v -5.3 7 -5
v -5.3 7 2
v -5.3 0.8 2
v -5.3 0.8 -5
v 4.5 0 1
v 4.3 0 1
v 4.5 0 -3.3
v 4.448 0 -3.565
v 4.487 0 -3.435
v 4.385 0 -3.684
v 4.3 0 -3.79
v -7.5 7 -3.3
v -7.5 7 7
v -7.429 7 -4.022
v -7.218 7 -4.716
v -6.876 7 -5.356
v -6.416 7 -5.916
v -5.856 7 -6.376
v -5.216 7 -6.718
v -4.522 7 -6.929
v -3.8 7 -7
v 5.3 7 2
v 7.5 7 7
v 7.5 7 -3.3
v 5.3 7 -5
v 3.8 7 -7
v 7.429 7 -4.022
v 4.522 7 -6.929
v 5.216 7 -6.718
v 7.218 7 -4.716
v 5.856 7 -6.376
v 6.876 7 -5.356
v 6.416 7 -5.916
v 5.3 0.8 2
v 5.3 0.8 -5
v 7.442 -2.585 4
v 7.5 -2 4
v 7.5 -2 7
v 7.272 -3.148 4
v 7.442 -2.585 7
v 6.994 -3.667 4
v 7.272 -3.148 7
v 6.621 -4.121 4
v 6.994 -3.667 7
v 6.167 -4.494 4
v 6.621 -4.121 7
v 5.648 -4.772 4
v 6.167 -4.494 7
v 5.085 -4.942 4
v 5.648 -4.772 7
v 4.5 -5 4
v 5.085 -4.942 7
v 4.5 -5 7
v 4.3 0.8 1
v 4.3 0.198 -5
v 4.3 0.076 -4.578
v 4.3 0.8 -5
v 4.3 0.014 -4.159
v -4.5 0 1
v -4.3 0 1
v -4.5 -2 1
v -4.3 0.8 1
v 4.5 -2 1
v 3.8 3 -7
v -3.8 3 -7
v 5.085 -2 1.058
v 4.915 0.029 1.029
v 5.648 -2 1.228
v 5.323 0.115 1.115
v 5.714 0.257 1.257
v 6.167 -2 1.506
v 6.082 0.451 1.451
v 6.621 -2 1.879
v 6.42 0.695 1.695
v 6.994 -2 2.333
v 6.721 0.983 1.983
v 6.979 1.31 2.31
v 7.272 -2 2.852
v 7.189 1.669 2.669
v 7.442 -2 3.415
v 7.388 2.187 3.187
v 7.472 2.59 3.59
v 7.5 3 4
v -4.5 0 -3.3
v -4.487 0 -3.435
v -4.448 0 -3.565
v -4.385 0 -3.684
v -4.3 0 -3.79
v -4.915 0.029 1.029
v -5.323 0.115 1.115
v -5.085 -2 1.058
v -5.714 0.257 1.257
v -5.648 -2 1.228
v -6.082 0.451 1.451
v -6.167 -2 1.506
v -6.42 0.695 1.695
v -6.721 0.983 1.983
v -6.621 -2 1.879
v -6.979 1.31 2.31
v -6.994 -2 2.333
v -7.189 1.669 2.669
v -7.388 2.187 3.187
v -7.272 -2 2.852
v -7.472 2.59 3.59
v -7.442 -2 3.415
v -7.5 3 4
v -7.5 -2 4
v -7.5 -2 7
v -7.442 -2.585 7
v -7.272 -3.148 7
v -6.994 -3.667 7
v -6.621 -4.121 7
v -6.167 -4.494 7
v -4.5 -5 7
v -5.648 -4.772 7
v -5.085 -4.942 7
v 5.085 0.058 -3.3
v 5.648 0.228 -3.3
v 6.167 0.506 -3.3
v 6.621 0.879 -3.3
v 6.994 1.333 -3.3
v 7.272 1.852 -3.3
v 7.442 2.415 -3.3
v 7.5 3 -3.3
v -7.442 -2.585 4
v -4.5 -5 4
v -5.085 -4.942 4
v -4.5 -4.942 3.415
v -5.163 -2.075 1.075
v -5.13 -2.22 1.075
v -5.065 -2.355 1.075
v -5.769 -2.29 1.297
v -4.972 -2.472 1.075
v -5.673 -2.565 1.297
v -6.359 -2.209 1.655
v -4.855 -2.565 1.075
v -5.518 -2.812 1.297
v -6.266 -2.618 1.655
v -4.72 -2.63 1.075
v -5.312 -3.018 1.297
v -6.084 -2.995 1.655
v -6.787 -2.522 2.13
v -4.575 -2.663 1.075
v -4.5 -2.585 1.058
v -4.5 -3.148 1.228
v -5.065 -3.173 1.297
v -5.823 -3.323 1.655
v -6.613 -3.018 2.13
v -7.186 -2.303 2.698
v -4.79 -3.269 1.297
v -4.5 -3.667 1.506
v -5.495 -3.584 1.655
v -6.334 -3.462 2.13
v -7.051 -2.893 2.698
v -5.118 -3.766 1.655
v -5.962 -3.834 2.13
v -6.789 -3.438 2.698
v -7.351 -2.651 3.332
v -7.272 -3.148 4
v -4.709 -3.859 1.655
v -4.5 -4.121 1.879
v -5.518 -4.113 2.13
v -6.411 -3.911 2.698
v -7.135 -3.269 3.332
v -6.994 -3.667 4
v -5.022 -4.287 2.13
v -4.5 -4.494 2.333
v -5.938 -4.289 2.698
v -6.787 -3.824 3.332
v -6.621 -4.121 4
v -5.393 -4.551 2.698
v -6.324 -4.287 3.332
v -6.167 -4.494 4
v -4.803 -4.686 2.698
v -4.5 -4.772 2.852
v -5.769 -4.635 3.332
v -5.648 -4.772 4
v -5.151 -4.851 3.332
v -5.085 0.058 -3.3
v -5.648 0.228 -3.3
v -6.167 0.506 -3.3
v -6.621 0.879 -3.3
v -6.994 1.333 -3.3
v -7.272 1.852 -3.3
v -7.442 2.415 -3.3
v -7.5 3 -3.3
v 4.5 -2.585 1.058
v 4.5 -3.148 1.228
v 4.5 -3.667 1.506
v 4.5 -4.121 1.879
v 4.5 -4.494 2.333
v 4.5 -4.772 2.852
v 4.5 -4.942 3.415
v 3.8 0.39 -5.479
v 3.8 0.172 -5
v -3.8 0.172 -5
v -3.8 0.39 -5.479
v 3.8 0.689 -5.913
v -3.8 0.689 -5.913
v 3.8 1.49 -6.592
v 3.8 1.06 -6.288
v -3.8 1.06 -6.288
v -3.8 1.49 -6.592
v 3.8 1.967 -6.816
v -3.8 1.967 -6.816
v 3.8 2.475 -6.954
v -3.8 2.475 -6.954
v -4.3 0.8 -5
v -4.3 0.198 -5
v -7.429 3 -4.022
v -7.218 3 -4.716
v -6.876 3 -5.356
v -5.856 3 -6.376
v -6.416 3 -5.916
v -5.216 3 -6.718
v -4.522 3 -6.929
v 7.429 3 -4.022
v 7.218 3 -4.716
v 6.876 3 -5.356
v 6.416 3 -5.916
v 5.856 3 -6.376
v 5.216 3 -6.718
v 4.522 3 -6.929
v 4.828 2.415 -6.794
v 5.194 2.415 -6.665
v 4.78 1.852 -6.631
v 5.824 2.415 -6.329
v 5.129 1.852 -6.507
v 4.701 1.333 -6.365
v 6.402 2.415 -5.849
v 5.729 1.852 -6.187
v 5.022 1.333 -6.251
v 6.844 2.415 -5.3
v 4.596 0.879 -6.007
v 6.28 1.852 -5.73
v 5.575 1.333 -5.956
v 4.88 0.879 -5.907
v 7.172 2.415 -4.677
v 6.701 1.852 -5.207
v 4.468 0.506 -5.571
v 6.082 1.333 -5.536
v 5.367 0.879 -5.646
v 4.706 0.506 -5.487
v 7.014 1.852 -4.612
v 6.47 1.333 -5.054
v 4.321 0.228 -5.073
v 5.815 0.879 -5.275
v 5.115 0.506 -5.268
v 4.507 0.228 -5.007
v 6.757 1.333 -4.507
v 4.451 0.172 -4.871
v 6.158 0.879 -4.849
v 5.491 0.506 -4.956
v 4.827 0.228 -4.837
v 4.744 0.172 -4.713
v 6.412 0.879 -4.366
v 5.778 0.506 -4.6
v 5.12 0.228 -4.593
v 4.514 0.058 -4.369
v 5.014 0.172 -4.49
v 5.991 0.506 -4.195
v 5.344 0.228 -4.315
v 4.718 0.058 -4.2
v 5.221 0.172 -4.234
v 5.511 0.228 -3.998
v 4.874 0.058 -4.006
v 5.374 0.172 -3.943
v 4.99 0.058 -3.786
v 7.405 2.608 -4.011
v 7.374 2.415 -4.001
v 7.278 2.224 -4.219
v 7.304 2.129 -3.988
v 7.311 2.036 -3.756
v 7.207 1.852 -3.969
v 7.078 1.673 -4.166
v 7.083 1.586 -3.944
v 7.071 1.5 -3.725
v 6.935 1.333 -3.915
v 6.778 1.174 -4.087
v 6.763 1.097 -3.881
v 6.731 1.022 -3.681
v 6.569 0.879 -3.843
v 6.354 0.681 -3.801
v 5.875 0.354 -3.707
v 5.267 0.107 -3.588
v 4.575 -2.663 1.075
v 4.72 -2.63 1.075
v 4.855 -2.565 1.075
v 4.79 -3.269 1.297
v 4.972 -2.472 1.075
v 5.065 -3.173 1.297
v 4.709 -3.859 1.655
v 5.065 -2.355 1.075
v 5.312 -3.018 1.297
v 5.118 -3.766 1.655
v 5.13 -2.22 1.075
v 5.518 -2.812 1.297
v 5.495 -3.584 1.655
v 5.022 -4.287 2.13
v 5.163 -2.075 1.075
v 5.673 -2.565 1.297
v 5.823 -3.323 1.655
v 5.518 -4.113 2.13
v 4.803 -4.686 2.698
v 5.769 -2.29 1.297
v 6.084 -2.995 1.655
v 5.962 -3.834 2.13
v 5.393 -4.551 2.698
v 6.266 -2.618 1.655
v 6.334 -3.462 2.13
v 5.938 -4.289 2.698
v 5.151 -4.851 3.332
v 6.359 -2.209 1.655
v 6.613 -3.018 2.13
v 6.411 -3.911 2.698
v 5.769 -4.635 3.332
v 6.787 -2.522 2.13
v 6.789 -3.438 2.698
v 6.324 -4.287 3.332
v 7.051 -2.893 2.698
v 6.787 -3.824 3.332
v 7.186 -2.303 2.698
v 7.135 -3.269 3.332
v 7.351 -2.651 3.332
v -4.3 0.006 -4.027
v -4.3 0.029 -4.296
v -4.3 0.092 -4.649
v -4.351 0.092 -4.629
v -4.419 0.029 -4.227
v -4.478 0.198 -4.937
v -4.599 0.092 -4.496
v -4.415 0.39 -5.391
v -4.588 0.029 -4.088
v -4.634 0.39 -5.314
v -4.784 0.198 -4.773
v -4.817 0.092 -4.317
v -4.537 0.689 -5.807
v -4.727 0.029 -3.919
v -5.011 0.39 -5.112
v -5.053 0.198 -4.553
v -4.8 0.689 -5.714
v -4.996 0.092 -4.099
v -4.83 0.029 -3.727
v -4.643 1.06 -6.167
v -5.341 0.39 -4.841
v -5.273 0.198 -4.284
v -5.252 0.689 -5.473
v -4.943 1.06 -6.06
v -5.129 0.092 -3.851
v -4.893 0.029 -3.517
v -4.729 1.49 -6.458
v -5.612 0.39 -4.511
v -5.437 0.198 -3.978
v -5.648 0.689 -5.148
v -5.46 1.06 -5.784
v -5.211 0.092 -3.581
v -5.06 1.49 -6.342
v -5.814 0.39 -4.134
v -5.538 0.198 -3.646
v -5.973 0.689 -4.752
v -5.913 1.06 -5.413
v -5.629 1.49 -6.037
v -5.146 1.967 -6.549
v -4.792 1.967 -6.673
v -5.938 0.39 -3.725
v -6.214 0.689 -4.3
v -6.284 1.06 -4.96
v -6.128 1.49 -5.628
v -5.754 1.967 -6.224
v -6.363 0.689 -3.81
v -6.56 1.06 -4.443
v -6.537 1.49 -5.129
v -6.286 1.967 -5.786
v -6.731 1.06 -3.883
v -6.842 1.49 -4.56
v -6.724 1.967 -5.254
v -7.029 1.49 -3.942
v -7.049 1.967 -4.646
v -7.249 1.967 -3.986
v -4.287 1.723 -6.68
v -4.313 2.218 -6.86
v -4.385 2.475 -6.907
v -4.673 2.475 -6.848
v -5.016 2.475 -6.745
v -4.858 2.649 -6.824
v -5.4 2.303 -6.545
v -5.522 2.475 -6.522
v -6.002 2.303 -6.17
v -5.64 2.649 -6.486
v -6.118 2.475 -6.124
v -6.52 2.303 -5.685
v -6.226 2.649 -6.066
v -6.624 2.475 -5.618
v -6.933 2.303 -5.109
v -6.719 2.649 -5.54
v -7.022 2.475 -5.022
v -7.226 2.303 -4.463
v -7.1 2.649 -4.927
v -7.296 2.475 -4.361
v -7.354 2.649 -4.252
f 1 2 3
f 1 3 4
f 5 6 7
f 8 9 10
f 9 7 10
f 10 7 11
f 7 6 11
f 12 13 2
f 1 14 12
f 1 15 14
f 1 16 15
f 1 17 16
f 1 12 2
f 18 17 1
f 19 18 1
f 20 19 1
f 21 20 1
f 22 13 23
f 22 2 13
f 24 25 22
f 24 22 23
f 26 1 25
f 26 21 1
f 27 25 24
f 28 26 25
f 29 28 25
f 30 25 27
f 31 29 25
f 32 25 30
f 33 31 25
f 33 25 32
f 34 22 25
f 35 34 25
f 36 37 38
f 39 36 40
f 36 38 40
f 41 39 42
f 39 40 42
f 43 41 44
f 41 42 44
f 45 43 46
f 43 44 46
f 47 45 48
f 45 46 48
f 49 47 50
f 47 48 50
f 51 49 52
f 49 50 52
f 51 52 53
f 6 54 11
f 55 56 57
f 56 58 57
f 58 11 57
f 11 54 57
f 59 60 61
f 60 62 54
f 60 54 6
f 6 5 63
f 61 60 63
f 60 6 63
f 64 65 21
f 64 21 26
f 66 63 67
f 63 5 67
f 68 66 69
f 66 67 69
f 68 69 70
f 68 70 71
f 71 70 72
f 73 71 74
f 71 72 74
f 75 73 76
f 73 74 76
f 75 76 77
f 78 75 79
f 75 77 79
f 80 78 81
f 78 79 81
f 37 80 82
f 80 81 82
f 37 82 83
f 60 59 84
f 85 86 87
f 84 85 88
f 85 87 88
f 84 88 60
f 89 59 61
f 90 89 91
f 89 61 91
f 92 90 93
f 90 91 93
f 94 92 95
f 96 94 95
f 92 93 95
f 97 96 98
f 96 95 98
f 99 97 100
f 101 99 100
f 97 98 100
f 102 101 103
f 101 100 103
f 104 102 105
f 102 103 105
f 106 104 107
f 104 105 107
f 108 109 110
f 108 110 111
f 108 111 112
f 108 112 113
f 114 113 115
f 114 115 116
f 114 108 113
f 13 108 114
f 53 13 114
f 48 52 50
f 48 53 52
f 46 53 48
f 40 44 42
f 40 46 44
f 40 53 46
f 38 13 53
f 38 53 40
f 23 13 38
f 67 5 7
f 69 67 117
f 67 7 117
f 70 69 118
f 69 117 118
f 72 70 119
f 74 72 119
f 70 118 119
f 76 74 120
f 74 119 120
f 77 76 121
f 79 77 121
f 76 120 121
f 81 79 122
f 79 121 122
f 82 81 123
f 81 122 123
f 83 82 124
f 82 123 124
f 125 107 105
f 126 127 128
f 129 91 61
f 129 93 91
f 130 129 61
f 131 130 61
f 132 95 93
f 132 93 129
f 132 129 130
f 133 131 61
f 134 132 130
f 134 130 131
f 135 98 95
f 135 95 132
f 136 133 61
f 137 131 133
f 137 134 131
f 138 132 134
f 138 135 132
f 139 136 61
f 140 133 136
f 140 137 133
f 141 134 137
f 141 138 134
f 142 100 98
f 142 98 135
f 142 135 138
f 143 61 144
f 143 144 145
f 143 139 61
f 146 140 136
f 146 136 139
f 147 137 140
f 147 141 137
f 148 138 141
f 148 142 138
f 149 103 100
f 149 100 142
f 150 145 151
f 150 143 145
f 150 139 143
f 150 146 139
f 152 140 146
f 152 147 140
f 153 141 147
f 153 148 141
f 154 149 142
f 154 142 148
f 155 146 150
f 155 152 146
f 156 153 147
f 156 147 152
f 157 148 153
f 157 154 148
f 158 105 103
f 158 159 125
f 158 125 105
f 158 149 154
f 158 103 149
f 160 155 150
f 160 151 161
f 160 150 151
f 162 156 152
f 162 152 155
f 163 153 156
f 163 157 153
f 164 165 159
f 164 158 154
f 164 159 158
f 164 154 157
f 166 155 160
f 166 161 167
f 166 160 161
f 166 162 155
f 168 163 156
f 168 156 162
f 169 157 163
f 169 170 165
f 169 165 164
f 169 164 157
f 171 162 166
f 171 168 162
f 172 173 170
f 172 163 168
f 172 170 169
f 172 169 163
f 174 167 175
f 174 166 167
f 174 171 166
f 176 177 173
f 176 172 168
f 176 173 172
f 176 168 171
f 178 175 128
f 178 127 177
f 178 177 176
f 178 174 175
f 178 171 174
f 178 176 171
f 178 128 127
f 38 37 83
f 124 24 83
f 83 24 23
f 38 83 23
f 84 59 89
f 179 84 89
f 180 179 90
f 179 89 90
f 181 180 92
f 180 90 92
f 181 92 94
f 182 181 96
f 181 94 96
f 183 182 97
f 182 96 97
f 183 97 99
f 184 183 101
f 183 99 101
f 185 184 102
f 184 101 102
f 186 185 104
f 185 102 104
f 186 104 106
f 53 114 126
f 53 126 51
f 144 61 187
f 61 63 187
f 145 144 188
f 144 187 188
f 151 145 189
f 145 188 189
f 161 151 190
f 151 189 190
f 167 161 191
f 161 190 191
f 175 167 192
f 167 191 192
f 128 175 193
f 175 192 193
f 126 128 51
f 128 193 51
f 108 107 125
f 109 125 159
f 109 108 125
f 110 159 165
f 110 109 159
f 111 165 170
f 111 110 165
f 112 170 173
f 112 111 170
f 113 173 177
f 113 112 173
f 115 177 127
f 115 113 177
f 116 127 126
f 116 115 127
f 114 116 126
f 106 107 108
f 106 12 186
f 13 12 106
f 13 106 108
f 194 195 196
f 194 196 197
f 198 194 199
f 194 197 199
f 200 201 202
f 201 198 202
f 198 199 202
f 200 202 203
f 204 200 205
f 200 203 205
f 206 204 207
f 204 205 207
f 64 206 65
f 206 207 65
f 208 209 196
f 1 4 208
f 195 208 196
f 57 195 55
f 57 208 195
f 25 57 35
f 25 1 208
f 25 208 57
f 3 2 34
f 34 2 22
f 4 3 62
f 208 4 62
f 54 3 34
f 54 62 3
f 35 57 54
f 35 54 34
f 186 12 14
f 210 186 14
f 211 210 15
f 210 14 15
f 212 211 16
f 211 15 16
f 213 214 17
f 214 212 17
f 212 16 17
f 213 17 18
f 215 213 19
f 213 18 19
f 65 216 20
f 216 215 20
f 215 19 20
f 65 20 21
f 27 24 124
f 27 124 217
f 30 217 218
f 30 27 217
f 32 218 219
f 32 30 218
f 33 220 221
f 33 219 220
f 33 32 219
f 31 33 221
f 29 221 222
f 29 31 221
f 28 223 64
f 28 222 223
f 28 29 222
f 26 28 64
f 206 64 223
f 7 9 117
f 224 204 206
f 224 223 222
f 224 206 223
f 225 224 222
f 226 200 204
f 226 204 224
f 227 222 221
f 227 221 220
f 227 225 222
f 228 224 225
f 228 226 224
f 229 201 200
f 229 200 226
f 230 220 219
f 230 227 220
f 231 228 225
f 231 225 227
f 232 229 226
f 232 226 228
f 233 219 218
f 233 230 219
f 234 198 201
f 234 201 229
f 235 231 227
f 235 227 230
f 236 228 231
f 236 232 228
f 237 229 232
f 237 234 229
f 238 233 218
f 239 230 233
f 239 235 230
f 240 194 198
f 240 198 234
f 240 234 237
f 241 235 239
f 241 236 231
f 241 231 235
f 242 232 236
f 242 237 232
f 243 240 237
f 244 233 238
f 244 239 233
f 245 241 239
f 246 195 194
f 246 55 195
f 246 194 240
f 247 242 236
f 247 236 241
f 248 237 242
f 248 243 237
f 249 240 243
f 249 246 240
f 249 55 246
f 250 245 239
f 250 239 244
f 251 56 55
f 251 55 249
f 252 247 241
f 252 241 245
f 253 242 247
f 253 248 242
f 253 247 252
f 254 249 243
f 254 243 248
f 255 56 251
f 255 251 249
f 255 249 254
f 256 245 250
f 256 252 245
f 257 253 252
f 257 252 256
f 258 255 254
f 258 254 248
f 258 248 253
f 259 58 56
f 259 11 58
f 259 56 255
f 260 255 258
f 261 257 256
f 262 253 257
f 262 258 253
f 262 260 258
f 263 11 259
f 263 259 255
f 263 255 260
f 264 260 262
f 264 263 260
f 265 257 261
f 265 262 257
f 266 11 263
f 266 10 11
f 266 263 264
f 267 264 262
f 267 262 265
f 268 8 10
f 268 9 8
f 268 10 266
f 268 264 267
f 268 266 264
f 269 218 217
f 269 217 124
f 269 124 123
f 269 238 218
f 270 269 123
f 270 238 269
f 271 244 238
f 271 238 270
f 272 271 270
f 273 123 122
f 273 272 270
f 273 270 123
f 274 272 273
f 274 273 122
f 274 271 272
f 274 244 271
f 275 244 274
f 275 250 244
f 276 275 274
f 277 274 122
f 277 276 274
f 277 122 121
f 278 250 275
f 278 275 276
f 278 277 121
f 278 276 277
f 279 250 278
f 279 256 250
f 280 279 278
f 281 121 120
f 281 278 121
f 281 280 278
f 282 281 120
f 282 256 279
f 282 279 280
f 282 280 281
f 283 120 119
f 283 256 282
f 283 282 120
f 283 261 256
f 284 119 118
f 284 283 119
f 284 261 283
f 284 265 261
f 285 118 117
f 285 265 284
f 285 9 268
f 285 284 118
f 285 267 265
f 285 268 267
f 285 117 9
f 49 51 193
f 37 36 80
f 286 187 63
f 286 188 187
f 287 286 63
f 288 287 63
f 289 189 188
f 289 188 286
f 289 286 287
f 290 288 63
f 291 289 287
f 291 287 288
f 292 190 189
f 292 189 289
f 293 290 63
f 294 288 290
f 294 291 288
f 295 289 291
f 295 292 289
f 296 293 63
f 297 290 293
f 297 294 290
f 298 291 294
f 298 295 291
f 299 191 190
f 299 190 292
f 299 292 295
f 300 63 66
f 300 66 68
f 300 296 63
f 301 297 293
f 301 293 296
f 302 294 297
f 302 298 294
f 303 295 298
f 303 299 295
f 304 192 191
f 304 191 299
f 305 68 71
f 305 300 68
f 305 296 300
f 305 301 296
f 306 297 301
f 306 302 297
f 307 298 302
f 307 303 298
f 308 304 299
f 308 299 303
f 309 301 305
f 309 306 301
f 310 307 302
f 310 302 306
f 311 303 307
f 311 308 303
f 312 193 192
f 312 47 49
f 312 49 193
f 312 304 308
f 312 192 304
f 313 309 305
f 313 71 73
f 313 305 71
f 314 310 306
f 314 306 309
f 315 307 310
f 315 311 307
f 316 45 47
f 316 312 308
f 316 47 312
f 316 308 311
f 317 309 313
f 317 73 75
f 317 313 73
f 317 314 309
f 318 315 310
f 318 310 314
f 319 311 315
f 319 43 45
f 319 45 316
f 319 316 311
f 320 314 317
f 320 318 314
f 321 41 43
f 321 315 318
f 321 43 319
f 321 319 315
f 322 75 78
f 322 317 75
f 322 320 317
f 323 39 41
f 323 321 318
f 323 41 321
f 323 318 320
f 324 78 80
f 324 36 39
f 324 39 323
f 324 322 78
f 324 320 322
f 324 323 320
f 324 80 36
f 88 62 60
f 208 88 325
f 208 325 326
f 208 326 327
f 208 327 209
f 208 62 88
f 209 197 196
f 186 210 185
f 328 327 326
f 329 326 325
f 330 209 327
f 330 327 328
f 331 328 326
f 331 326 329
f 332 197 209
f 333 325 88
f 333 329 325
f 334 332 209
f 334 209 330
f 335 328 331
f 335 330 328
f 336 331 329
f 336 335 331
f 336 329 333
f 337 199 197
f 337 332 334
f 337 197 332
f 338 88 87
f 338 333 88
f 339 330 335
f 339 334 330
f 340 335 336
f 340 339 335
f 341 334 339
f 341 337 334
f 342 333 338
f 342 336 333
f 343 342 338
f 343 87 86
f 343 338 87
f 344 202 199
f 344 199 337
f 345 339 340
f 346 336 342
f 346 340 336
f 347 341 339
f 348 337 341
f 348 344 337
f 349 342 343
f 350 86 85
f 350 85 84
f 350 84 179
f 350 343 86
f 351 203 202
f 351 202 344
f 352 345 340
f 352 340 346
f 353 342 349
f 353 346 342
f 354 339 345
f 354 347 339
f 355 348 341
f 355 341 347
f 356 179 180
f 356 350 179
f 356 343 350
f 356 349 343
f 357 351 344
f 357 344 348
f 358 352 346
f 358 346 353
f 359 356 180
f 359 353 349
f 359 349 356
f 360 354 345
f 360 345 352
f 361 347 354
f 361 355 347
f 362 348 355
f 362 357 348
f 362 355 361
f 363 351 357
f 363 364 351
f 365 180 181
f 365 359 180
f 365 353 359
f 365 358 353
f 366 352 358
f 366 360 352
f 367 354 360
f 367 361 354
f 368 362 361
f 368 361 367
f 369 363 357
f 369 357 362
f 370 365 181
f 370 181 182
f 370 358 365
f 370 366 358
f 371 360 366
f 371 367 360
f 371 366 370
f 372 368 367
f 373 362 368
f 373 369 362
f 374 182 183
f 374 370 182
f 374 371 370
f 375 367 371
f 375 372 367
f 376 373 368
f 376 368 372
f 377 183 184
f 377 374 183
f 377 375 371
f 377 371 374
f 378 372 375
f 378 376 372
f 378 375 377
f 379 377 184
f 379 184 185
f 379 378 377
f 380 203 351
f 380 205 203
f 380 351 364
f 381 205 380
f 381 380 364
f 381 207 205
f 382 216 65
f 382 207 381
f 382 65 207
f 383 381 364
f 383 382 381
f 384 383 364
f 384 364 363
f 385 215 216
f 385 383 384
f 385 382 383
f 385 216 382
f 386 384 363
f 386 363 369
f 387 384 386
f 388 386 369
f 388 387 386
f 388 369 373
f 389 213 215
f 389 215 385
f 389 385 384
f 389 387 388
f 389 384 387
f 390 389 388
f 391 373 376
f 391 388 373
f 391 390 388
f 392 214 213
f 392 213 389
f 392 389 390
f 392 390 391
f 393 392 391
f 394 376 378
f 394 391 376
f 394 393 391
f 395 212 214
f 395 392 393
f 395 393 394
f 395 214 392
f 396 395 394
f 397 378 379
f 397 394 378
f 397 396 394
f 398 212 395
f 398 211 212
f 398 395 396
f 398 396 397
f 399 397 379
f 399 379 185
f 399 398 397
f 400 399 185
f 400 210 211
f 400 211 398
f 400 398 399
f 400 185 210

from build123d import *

# Parameters (mm, degrees)
SKETCH1_W           = 15
SKETCH1_H           = 14
BOSS_EXTRUDE1_DEPTH = 7
FILLET1_R           = 3.7
SKETCH2_W           = 10.6
SKETCH2_H           = 7
CUT_EXTRUDE1_DEPTH  = 6.2
SKETCH3_W           = 8.6
SKETCH3_H           = 6
CUT_EXTRUDE2_DEPTH  = 12.987076374
SKETCH4_W           = 15
SKETCH4_H           = 6
BOSS_EXTRUDE2_DEPTH = 5
FILLET8_R           = 3
FILLET9_R           = 3
FILLET10_R          = 3


with BuildPart() as part:
    # Sketch1 → Boss-Extrude1 (new body)
    with BuildSketch(Plane(origin=(0, 0, 0), x_dir=(1, 0, 0), z_dir=(0, 1, 0))):
        Rectangle(SKETCH1_W, SKETCH1_H)
    extrude(amount=BOSS_EXTRUDE1_DEPTH)

    # Fillet1
    fillet1_edges = [part.edges().sort_by_distance(p)[0] for p in [
        (-7.5, 3.5, -7),
        (7.5, 3.5, -7),
    ]]
    fillet(fillet1_edges, radius=FILLET1_R)

    # Sketch2 → Cut-Extrude1 (cut)
    with BuildSketch(Plane(origin=(0, 7, 0), x_dir=(1, 0, 0), z_dir=(0, 1, 0))):
        with Locations((0, 1.5)):
            Rectangle(SKETCH2_W, SKETCH2_H)
    extrude(amount=-CUT_EXTRUDE1_DEPTH, mode=Mode.SUBTRACT)

    # Sketch3 → Cut-Extrude2 (cut, through all)
    with BuildSketch(Plane(origin=(0, 0.8, 0), x_dir=(1, 0, 0), z_dir=(0, 1, 0))):
        with Locations((0, 2)):
            Rectangle(SKETCH3_W, SKETCH3_H)
    extrude(amount=-CUT_EXTRUDE2_DEPTH, mode=Mode.SUBTRACT)

    # Sketch4 → Boss-Extrude2 (add)
    with BuildSketch(Plane.XZ):
        with Locations((0, 4)):
            Rectangle(SKETCH4_W, SKETCH4_H)
    extrude(amount=BOSS_EXTRUDE2_DEPTH)

    # Fillet8
    fillet8_edges = [part.edges().sort_by_distance(p)[0] for p in [
        (-7.5, -5, 4),
        (7.5, -5, 4),
    ]]
    fillet(fillet8_edges, radius=FILLET8_R)

    # Fillet9
    # the kernel refuses this fillet: 3 mm, written as the material it takes off along each edge
    with BuildSketch(Plane(origin=(-3.8, 0, -3.3), x_dir=(0, 0, -1), z_dir=(1, 0, 0))) as fillet9_piece_1:
        with BuildLine():
            CenterArc((3.7 - FILLET9_R, FILLET9_R), FILLET9_R, 270, 90)
            Line((3.7, FILLET9_R), (3.7, 0))
            Line((3.7, 0), (3.7 - FILLET9_R, 0))
        make_face()
    revolve(axis=Axis((-3.8, 0, -3.3), (0, 1, 0)), revolution_arc=90, mode=Mode.SUBTRACT)
    with BuildSketch(Plane(origin=(3.8, 0, -3.3), x_dir=(0, 0, -1), z_dir=(-1, 0, 0))) as fillet9_piece_2:
        with BuildLine():
            CenterArc((3.7 - FILLET9_R, -FILLET9_R), FILLET9_R, 0, 90)
            Line((3.7, -FILLET9_R), (3.7, 0))
            Line((3.7, 0), (3.7 - FILLET9_R, 0))
        make_face()
    revolve(axis=Axis((3.8, 0, -3.3), (0, -1, 0)), revolution_arc=90, mode=Mode.SUBTRACT)
    with BuildSketch(Plane(origin=(-7.5, 0, 1), x_dir=(0, 1, 0), z_dir=(0, 0, -1))) as fillet9_piece_3:
        with BuildLine():
            CenterArc((FILLET9_R, FILLET9_R), FILLET9_R, 180, 90)
            Line((0, FILLET9_R), (0, 0))
            Line((0, 0), (FILLET9_R, 0))
        make_face()
    extrude(amount=4.3, mode=Mode.SUBTRACT)
    with BuildSketch(Plane(origin=(7.5, 0, -3.3), x_dir=(-1, 0, 0), z_dir=(0, 0, 1))) as fillet9_piece_4:
        with BuildLine():
            CenterArc((FILLET9_R, -FILLET9_R), FILLET9_R, 90, 90)
            Line((0, -FILLET9_R), (0, 0))
            Line((0, 0), (FILLET9_R, 0))
        make_face()
    extrude(amount=4.3, mode=Mode.SUBTRACT)
    with BuildSketch(Plane(origin=(-3.8, 0, -7), x_dir=(0, 0, 1), z_dir=(1, 0, 0))) as fillet9_piece_5:
        with BuildLine():
            CenterArc((FILLET9_R, -FILLET9_R), FILLET9_R, 90, 90)
            Line((0, -FILLET9_R), (0, 0))
            Line((0, 0), (FILLET9_R, 0))
        make_face()
    extrude(amount=7.6, mode=Mode.SUBTRACT)

    # Fillet10
    fillet10_edges = [part.edges().sort_by_distance(p)[0] for p in [
        (0, -5, 1),
        (7.5, 0.5, 1),
        (-7.5, 0.5, 1),
        (6.621320344, -4.121320344, 1),
        (-6.621320344, -4.121320344, 1),
    ]]
    fillet(fillet10_edges, radius=FILLET10_R)


solid = part.part
